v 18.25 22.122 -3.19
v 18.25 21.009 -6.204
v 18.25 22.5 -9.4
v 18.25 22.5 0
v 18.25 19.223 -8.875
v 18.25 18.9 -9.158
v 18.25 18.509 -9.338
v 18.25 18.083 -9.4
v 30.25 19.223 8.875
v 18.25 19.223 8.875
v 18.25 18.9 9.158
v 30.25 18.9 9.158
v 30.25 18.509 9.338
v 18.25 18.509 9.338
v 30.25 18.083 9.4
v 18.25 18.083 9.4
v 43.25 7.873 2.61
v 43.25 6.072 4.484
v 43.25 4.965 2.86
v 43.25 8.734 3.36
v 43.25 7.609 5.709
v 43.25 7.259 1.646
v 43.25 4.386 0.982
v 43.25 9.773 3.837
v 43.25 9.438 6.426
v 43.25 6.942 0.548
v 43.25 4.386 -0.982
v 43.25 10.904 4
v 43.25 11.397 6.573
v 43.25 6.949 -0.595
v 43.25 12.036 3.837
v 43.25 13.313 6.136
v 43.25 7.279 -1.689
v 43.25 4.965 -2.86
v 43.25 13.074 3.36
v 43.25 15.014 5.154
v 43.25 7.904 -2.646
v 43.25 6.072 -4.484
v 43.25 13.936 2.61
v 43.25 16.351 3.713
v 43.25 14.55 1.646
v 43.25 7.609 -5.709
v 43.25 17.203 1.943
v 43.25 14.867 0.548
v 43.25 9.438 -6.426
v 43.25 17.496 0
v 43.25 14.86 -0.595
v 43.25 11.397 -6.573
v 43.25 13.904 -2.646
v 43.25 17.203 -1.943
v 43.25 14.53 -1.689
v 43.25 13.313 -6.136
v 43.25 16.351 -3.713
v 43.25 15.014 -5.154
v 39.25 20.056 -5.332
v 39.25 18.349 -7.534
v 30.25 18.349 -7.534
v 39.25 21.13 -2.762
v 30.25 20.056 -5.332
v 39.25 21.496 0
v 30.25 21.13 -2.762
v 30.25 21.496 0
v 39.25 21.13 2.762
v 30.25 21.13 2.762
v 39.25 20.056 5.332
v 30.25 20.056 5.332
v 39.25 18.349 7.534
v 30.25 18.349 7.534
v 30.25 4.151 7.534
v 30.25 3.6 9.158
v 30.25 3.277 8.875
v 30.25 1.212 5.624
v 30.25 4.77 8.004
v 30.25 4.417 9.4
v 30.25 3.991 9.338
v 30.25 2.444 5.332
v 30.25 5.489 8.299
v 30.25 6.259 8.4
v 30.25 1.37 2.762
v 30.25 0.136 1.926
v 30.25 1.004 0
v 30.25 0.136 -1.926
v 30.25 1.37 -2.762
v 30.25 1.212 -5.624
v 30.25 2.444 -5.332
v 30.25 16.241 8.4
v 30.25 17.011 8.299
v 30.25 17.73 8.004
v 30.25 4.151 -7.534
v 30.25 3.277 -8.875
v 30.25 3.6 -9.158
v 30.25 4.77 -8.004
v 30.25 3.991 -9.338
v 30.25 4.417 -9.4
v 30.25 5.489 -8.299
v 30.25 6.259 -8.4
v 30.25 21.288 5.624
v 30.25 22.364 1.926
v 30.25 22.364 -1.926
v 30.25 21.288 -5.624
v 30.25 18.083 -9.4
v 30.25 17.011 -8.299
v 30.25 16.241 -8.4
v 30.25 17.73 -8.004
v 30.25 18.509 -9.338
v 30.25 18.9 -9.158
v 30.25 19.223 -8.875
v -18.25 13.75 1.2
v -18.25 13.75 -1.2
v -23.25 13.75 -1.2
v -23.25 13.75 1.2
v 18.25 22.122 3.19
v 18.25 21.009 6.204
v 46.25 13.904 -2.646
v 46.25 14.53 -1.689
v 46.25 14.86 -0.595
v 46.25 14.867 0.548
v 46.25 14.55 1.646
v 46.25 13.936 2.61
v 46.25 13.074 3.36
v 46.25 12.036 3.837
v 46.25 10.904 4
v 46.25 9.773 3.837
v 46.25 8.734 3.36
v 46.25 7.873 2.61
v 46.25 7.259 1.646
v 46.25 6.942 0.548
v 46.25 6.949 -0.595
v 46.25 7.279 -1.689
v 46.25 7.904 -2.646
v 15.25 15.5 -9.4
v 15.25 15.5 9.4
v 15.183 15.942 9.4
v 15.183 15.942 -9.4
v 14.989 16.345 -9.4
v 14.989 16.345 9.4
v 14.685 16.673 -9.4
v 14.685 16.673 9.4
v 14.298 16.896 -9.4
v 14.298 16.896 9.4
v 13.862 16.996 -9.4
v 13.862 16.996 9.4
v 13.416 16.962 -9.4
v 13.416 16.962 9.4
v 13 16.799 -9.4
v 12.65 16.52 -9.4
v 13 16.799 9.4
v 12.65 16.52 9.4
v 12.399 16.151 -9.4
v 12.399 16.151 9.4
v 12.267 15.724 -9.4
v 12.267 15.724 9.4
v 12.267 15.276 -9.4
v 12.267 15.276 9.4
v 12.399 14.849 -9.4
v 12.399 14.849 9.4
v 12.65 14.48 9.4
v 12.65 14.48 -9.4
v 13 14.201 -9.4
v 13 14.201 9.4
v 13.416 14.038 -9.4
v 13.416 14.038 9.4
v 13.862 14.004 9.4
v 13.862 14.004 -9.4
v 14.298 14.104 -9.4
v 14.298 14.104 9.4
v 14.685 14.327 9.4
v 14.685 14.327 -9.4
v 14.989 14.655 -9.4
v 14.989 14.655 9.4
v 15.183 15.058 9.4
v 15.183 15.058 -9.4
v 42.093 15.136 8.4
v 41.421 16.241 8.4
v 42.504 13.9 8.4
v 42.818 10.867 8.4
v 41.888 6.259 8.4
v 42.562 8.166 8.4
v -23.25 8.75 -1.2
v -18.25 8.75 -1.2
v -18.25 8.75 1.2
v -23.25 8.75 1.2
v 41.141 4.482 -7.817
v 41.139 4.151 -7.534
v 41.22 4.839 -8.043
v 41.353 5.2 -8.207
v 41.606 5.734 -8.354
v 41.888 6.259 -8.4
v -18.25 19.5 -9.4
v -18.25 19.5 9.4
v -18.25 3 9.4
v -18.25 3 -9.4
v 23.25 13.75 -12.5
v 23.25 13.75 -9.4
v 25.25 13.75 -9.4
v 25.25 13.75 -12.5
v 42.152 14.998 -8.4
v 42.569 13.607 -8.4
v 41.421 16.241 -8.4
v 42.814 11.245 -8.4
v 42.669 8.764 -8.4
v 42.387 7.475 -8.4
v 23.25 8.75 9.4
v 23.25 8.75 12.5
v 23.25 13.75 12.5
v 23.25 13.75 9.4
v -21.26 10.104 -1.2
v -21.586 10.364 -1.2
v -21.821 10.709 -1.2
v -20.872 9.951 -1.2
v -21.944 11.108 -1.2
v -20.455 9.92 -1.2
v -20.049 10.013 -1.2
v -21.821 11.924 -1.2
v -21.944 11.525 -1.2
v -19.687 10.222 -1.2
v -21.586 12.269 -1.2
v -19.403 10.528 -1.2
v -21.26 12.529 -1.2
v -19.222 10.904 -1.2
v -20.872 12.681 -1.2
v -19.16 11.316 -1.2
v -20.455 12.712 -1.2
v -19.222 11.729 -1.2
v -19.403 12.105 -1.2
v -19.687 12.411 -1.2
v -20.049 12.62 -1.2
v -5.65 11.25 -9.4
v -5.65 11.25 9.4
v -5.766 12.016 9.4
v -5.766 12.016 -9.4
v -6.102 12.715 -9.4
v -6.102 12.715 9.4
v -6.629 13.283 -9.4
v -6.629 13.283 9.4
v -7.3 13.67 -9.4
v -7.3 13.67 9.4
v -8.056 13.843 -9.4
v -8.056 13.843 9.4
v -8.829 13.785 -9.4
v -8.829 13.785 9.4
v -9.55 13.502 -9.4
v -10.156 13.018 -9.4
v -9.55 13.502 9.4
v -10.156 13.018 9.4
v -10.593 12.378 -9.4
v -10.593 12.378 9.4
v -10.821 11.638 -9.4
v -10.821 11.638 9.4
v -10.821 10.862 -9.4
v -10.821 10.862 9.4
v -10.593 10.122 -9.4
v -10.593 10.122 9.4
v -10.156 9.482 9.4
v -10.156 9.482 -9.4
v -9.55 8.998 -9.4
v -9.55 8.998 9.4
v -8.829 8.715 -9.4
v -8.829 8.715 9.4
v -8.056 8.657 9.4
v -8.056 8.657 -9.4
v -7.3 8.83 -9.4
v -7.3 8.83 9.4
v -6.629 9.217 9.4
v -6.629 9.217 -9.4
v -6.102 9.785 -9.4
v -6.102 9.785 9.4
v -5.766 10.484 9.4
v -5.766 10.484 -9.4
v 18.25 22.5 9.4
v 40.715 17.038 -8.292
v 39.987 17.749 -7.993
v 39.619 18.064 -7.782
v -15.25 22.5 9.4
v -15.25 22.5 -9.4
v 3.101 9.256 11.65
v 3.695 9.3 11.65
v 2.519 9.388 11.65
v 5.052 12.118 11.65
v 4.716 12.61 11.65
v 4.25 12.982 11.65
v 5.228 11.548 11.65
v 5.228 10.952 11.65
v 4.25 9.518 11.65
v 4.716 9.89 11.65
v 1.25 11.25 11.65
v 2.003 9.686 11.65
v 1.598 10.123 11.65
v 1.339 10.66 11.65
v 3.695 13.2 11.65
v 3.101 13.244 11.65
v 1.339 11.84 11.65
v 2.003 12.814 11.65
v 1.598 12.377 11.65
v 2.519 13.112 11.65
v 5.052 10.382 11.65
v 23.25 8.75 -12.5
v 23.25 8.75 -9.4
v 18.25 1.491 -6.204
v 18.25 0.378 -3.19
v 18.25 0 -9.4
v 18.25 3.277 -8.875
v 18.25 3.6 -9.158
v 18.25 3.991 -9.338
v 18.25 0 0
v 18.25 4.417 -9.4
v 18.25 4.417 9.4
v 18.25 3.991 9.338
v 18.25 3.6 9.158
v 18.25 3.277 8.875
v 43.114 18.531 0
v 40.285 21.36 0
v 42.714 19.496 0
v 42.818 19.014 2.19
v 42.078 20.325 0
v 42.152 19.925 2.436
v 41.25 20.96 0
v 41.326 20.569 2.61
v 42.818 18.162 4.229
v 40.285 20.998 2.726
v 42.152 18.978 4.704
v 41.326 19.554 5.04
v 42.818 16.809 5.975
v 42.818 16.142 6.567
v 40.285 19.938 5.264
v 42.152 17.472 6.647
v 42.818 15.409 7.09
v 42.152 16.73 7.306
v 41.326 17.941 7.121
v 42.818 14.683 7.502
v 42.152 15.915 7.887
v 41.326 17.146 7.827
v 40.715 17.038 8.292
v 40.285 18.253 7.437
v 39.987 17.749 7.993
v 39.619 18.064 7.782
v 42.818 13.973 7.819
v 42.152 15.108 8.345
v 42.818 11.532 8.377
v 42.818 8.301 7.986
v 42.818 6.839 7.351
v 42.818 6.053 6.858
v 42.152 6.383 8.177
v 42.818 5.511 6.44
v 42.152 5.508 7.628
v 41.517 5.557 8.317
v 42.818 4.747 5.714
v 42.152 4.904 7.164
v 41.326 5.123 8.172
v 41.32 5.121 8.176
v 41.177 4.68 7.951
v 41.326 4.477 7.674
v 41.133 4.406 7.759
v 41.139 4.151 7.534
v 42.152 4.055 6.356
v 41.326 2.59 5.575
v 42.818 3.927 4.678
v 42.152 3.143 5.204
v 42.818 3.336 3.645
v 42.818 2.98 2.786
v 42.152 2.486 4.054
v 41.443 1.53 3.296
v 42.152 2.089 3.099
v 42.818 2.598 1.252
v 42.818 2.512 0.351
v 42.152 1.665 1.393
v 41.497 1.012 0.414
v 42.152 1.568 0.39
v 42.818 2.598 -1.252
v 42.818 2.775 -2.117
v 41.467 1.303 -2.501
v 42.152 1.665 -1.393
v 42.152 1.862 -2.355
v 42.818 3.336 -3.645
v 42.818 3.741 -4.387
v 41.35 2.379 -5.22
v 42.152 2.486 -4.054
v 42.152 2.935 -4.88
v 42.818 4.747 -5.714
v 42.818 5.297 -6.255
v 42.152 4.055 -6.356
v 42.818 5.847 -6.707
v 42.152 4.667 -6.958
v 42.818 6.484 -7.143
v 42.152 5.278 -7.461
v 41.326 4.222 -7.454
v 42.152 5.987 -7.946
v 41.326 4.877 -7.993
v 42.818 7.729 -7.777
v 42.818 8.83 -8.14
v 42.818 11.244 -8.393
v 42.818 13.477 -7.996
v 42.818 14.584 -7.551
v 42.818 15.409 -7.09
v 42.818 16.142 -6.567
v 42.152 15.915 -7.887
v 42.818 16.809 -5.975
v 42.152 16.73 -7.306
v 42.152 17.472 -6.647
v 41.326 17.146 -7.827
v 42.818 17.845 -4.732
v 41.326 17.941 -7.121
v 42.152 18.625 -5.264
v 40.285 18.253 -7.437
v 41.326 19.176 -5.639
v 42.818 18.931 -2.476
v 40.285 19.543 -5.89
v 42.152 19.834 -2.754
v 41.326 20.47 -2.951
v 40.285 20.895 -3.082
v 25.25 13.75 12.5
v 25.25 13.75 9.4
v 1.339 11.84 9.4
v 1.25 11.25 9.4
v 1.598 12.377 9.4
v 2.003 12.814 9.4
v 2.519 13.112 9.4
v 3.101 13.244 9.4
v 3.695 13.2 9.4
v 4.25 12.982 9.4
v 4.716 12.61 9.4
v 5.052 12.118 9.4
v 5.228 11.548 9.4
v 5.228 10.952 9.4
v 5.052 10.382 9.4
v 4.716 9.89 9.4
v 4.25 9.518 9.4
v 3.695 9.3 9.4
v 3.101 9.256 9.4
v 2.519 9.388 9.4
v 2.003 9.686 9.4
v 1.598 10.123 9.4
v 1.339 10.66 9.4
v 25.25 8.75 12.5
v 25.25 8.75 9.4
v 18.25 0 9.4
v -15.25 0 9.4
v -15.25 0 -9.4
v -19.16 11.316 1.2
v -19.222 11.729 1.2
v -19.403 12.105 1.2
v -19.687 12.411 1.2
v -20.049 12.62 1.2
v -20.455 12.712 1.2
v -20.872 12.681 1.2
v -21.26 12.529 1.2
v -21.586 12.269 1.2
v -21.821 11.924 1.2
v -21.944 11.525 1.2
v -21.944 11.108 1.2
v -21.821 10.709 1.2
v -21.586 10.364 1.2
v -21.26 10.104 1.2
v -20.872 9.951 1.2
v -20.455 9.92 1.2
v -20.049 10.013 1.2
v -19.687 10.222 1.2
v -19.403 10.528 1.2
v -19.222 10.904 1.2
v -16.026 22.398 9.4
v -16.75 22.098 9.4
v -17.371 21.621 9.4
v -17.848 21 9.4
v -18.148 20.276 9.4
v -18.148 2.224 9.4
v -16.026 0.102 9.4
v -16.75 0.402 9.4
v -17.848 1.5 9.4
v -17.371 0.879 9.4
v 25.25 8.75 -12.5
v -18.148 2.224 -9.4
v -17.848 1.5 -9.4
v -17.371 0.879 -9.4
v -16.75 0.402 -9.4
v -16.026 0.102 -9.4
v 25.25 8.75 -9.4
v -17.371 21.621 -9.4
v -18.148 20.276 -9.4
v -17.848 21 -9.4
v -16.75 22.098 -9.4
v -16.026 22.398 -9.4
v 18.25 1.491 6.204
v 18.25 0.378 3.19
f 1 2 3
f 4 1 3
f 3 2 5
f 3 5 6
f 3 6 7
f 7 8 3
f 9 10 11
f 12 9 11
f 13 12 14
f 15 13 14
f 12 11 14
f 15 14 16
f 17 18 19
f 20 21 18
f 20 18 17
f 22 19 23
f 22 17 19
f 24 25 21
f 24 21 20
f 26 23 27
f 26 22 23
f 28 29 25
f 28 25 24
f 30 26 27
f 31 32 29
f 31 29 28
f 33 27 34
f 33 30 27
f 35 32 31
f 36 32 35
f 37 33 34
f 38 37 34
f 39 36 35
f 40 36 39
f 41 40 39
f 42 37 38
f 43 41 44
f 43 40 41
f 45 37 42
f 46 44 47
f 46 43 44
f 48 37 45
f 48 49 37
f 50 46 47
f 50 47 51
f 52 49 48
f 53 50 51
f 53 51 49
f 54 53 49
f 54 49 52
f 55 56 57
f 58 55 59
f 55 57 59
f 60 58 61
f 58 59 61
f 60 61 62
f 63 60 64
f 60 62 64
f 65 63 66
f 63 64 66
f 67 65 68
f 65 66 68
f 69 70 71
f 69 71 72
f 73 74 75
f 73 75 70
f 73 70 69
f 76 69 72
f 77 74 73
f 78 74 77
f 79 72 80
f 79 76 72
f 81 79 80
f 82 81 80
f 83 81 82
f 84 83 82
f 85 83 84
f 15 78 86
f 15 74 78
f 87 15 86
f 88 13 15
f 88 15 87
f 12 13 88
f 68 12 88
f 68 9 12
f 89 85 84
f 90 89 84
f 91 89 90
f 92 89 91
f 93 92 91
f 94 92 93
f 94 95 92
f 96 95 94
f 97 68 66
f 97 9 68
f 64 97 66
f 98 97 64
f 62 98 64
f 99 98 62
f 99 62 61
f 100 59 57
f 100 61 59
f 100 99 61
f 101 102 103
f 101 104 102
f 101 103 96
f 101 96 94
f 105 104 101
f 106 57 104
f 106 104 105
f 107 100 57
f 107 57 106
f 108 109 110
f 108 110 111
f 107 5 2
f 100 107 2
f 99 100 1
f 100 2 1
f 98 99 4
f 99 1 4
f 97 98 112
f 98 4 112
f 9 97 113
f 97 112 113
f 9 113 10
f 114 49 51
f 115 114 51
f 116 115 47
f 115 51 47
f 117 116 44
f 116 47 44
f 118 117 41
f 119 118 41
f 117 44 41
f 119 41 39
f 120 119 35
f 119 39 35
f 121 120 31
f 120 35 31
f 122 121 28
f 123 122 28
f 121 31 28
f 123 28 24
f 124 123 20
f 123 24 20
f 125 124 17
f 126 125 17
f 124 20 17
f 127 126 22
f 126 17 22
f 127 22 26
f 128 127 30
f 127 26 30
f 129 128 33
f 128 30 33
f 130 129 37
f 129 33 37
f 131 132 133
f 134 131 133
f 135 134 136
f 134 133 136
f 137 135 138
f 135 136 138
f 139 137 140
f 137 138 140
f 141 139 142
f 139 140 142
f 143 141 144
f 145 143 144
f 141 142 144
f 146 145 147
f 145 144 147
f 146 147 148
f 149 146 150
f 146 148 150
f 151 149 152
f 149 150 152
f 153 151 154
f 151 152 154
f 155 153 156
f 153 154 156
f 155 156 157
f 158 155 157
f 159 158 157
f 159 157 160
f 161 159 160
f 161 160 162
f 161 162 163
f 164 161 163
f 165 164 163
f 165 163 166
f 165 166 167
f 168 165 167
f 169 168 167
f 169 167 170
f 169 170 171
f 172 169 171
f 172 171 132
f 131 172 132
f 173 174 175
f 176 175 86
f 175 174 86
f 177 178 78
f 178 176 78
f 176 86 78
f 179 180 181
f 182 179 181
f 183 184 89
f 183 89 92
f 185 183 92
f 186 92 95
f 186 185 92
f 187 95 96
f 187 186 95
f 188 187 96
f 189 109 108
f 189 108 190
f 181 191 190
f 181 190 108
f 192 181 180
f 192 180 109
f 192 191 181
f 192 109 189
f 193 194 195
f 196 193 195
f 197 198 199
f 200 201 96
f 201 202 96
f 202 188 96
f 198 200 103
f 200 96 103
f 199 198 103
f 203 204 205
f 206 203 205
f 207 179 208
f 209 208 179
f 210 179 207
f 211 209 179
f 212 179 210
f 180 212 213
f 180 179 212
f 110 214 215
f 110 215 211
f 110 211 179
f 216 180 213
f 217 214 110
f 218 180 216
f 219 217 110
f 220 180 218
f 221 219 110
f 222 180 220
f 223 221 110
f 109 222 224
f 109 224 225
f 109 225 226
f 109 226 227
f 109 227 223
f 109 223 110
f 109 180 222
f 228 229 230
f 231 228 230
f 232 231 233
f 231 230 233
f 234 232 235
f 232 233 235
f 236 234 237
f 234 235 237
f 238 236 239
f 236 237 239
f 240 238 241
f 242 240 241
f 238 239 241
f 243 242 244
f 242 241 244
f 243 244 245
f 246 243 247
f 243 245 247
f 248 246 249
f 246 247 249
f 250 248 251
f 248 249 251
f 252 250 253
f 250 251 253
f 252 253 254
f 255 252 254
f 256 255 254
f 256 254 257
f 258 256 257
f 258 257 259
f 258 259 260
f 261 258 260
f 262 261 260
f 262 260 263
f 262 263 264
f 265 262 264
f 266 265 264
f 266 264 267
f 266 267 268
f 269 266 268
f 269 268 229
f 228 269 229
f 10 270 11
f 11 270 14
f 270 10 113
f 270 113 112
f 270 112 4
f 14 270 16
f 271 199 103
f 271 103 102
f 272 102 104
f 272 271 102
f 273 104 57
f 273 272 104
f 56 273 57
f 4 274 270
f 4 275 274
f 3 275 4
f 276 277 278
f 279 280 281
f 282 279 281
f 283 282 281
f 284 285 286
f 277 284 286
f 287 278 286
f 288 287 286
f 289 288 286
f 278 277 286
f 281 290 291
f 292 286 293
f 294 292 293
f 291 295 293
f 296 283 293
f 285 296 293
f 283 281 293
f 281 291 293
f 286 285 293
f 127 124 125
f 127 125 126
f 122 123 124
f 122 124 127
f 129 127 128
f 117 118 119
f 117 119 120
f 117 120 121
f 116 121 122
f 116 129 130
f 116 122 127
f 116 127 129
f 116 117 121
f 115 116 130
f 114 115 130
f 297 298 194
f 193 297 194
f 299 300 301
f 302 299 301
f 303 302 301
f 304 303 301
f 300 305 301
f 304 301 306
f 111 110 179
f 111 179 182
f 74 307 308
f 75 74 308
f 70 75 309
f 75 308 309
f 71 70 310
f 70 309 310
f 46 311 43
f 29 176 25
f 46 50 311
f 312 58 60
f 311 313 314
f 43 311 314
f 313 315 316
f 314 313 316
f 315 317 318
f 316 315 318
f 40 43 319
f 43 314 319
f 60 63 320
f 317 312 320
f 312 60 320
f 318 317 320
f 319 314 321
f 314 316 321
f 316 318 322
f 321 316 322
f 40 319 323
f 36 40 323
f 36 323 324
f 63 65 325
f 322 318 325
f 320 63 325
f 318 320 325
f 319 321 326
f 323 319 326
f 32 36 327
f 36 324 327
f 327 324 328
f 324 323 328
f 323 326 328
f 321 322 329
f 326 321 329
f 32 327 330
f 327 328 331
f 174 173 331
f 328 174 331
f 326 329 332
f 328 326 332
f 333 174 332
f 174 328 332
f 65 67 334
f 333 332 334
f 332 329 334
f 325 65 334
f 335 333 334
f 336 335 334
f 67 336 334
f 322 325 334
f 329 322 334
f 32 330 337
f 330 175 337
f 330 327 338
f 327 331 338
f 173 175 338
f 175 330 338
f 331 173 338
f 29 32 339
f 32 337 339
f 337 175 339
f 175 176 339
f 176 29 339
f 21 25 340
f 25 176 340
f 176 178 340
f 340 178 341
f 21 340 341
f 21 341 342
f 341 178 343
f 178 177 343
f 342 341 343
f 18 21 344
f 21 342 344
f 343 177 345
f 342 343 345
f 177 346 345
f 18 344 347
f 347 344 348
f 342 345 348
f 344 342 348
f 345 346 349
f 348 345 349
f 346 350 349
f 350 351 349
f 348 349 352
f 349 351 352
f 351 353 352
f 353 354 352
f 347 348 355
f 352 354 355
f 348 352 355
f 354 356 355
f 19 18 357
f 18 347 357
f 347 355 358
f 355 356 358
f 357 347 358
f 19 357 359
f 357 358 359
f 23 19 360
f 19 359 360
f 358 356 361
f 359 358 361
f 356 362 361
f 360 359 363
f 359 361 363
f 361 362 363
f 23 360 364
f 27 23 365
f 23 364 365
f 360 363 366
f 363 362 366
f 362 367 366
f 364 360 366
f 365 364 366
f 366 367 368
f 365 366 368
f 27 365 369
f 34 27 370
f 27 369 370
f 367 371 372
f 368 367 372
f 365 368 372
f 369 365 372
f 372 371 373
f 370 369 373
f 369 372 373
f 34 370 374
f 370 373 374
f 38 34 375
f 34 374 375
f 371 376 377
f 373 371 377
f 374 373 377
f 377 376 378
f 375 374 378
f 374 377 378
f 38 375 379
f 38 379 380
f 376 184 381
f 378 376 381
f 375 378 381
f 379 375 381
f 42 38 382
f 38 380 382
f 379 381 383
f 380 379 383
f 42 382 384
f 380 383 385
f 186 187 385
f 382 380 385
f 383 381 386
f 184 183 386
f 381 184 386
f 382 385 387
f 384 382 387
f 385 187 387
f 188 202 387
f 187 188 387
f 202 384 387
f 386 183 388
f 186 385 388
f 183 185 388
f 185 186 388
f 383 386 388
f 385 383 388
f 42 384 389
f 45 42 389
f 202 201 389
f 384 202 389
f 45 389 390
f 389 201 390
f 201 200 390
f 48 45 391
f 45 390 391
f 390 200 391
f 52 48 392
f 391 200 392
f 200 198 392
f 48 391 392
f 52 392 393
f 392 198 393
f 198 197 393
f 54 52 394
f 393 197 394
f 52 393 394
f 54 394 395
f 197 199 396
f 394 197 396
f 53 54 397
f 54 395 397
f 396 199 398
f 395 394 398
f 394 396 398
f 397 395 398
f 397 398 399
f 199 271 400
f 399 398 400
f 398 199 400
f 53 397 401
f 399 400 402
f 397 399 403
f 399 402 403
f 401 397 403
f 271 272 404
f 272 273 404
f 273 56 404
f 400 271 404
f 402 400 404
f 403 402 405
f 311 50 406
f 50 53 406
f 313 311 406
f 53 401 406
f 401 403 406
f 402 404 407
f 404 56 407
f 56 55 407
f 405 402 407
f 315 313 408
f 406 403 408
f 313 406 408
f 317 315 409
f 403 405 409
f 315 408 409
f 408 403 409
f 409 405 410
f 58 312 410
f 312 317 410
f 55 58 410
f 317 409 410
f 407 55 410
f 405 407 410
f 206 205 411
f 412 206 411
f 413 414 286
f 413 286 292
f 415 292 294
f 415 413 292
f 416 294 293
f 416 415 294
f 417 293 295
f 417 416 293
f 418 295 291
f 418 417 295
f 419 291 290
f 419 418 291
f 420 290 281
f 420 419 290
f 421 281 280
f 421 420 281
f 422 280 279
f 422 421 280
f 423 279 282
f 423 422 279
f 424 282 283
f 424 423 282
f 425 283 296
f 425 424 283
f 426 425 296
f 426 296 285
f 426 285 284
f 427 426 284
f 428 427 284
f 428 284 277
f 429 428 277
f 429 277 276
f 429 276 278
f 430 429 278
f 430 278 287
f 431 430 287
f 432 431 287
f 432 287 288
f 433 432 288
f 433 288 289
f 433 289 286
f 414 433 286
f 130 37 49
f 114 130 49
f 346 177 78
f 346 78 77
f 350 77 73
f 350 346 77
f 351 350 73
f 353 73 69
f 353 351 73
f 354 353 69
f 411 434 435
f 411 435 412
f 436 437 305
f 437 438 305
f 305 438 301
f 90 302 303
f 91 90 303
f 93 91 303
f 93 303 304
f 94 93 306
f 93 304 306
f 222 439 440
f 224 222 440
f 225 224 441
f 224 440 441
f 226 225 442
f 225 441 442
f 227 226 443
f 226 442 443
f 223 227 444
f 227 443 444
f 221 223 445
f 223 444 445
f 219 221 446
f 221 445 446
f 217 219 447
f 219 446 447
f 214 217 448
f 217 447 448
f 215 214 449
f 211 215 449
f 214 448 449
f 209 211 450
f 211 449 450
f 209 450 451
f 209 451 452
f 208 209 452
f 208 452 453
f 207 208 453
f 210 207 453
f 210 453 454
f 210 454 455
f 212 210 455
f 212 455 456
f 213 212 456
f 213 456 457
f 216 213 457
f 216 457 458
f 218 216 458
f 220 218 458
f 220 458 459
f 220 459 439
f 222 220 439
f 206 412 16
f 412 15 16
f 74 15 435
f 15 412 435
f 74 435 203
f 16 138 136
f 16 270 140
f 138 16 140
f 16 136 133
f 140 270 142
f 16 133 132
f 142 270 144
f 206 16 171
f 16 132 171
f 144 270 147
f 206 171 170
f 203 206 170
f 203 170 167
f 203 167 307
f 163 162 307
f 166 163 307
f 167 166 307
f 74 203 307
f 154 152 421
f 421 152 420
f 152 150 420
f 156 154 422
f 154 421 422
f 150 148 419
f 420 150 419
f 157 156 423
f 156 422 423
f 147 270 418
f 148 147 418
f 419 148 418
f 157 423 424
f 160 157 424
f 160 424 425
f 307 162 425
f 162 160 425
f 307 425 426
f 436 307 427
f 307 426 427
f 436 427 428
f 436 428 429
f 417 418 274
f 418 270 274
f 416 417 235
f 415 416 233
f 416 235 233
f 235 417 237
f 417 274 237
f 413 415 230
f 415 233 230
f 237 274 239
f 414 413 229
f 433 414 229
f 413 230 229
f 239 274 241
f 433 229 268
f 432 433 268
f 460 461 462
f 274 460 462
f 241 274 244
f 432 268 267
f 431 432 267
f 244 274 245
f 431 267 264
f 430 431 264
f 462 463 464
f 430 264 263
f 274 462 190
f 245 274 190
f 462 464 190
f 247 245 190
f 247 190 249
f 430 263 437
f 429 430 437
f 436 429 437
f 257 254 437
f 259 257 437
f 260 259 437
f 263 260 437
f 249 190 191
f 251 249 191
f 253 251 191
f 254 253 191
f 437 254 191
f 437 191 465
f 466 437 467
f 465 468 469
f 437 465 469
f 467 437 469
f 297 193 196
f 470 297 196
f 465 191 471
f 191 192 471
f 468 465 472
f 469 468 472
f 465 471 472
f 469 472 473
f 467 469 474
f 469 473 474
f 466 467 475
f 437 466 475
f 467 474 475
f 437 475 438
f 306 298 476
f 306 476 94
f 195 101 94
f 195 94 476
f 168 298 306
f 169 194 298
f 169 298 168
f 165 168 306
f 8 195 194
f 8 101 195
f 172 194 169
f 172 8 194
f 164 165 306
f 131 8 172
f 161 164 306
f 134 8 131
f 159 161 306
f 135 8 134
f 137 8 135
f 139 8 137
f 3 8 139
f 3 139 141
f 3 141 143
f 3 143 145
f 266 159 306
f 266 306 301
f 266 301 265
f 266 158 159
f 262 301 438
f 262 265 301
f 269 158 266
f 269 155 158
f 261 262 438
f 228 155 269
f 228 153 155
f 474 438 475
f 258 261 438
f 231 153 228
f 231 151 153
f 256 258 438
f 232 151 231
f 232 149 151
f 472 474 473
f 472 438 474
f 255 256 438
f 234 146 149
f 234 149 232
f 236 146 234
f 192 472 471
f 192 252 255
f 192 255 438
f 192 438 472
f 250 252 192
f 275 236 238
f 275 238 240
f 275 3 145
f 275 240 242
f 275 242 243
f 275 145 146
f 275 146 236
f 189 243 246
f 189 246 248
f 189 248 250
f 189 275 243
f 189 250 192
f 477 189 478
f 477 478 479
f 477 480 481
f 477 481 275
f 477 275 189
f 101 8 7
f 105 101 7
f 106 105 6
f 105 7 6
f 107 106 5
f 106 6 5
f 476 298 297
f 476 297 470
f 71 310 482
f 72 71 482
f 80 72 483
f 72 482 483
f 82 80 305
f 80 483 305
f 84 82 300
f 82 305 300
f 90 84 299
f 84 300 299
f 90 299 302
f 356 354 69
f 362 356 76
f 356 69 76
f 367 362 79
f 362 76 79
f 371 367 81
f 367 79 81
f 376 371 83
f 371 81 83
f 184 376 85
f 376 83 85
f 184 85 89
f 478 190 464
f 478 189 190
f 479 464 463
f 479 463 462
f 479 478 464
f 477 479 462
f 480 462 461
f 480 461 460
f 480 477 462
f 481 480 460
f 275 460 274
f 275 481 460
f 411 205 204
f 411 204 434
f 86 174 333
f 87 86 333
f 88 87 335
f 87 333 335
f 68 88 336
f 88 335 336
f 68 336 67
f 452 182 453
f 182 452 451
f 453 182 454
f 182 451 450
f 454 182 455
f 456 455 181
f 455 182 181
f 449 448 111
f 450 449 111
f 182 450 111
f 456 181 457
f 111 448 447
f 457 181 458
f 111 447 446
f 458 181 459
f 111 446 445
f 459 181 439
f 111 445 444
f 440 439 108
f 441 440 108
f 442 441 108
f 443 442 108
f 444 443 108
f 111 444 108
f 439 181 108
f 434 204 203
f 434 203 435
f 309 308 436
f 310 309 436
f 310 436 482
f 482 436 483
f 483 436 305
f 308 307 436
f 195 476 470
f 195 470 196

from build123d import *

# Parameters (mm, degrees)
SKETCH_1_W          = 36.5
SKETCH_1_H          = 18.8
EXTRUDE_1_DEPTH     = 22.5
FILLET_1_R          = 3
SKETCH_2_R          = 2.6
CUT_EXTRUDE_1_DEPTH = 35.536249073
SKETCH_3_W          = 2.4
SKETCH_3_H          = 5
EXTRUDE_2_DEPTH     = 5
SKETCH_4_R          = 1.4
CUT_EXTRUDE_2_DEPTH = 35.046622446
EXTRUDE_3_DEPTH     = 12
EXTRUDE_4_DEPTH     = 13
FILLET_2_R          = 3
EXTRUDE_5_DEPTH     = 3
SKETCH_9_R          = 2
EXTRUDE_7_DEPTH     = 21.05
SKETCH_10_W         = 2
SKETCH_10_H         = 5
EXTRUDE_8_DEPTH     = 12.5
SKETCH_11_R         = 1.5
CUT_EXTRUDE_3_DEPTH = 56.901006252


with BuildPart() as part:
    # 草图1 → 凸台-拉伸1 (new body)
    with BuildSketch(Plane(origin=(0, 0, 0), x_dir=(1, 0, 0), z_dir=(0, 1, 0))):
        Rectangle(SKETCH_1_W, SKETCH_1_H)
    extrude(amount=EXTRUDE_1_DEPTH)

    # 圆角1
    fillet_1_edges = [part.edges().sort_by_distance(p)[0] for p in [
        (-18.25, 22.5, 0),
        (-18.25, 0, 0),
    ]]
    fillet(fillet_1_edges, radius=FILLET_1_R)

    # 草图2 → 切除-拉伸1 (cut, through all)
    with BuildSketch(Plane.XY.offset(9.4)):
        with Locations((-8.25, 11.25)):
            Circle(SKETCH_2_R)
    extrude(amount=-CUT_EXTRUDE_1_DEPTH, mode=Mode.SUBTRACT)

    # 草图3 → 凸台-拉伸2 (add)
    with BuildSketch(Plane.ZY.offset(18.25)):
        with Locations((0, 11.25)):
            Rectangle(SKETCH_3_W, SKETCH_3_H)
    extrude(amount=EXTRUDE_2_DEPTH)

    # 草图4 → 切除-拉伸2 (cut, through all)
    with BuildSketch(Plane.XY.offset(1.2)):
        with Locations((-20.559983935, 11.316362833)):
            Circle(SKETCH_4_R)
    extrude(amount=-CUT_EXTRUDE_2_DEPTH, mode=Mode.SUBTRACT)

    # 草图5 → 凸台-拉伸3 (add)
    with BuildSketch(Plane(origin=(18.25, 0, 0), x_dir=(0, 0, -1), z_dir=(1, 0, 0))):
        with BuildLine():
            Line((-9.4, 18.083062757), (-9.4, 4.416937243))
            ThreePointArc((-9.4, 4.416937243), (-9.262387752, 3.78932302), (-8.874800516, 3.276865335))
            ThreePointArc((-8.874800516, 3.276865335), (0, 0), (8.874800516, 3.276865335))
            ThreePointArc((8.874800516, 3.276865335), (9.262387752, 3.78932302), (9.4, 4.416937243))
            Line((9.4, 4.416937243), (9.4, 18.083062757))
            ThreePointArc((9.4, 18.083062757), (9.262387752, 18.71067698), (8.874800516, 19.223134665))
            ThreePointArc((8.874800516, 19.223134665), (0, 22.5), (-8.874800516, 19.223134665))
            ThreePointArc((-8.874800516, 19.223134665), (-9.262387752, 18.71067698), (-9.4, 18.083062757))
        make_face()
    extrude(amount=EXTRUDE_3_DEPTH)

    # 草图6 → 凸台-拉伸4 (add)
    with BuildSketch(Plane(origin=(30.25, 0, 0), x_dir=(0, 0, -1), z_dir=(1, 0, 0))):
        with BuildLine():
            Line((-8.4, 17.356141187), (-8.4, 5.143858813))
            ThreePointArc((-8.4, 5.143858813), (0, 1.003858813), (8.4, 5.143858813))
            Line((8.4, 5.143858813), (8.4, 17.356141187))
            ThreePointArc((8.4, 17.356141187), (0, 21.496141187), (-8.4, 17.356141187))
        make_face()
    extrude(amount=EXTRUDE_4_DEPTH)

    # 圆角2
    fillet_2_edges = [part.edges().sort_by_distance(p)[0] for p in [
        (36.75, 5.143858813, 8.4),
        (36.75, 5.143858813, -8.4),
        (36.75, 17.356141187, -8.4),
        (36.75, 17.356141187, 8.4),
    ]]
    fillet(fillet_2_edges, radius=FILLET_2_R)

    # 圆角3: read off the stored shape, not the designer's step
    # 圆角3 outline → 圆角3 (revolve, cut)
    with BuildSketch(Plane(origin=(0, 10.904402057, 0), x_dir=(0, 1, 0), z_dir=(0, 0, -1))):
        with BuildLine():
            ThreePointArc((6.59173913, 43.25), (9.420166255, 42.078427125), (10.59173913, 39.25))
            Line((10.59173913, 39.25), (10.59173913, 43.25))
            Line((10.59173913, 43.25), (6.59173913, 43.25))
        make_face()
    revolve(axis=Axis((0, 10.904402057, 0), (1, 0, 0)), mode=Mode.SUBTRACT)

    # 草图7 → 凸台-拉伸5 (add)
    with BuildSketch(Plane(origin=(43.25, 0, 0), x_dir=(0, 0, -1), z_dir=(1, 0, 0))):
        with BuildLine():
            Line((2.645751311, 7.904402057), (2.645751311, 13.904402057))
            ThreePointArc((2.645751311, 13.904402057), (-4, 10.904402057), (2.645751311, 7.904402057))
        make_face()
    extrude(amount=EXTRUDE_5_DEPTH)

    # 草图9 → 凸台-拉伸7 (add)
    with BuildSketch(Plane(origin=(0, 0, -9.4), x_dir=(-1, 0, 0), z_dir=(0, 0, -1))):
        with Locations((-3.25, 11.25)):
            Circle(SKETCH_9_R)
    extrude(amount=-EXTRUDE_7_DEPTH)

    # 草图10 → 凸台-拉伸8 (add, symmetric)
    with BuildSketch(Plane.XY):
        with Locations((24.25, 11.25)):
            Rectangle(SKETCH_10_W, SKETCH_10_H)
    extrude(amount=EXTRUDE_8_DEPTH, both=True)

    # 草图11 → 切除-拉伸3 (cut, through all)
    with BuildSketch(Plane.XY.offset(9.4)):
        with Locations((13.75, 15.5)):
            Circle(SKETCH_11_R)
    extrude(amount=-CUT_EXTRUDE_3_DEPTH, mode=Mode.SUBTRACT)


solid = part.part
